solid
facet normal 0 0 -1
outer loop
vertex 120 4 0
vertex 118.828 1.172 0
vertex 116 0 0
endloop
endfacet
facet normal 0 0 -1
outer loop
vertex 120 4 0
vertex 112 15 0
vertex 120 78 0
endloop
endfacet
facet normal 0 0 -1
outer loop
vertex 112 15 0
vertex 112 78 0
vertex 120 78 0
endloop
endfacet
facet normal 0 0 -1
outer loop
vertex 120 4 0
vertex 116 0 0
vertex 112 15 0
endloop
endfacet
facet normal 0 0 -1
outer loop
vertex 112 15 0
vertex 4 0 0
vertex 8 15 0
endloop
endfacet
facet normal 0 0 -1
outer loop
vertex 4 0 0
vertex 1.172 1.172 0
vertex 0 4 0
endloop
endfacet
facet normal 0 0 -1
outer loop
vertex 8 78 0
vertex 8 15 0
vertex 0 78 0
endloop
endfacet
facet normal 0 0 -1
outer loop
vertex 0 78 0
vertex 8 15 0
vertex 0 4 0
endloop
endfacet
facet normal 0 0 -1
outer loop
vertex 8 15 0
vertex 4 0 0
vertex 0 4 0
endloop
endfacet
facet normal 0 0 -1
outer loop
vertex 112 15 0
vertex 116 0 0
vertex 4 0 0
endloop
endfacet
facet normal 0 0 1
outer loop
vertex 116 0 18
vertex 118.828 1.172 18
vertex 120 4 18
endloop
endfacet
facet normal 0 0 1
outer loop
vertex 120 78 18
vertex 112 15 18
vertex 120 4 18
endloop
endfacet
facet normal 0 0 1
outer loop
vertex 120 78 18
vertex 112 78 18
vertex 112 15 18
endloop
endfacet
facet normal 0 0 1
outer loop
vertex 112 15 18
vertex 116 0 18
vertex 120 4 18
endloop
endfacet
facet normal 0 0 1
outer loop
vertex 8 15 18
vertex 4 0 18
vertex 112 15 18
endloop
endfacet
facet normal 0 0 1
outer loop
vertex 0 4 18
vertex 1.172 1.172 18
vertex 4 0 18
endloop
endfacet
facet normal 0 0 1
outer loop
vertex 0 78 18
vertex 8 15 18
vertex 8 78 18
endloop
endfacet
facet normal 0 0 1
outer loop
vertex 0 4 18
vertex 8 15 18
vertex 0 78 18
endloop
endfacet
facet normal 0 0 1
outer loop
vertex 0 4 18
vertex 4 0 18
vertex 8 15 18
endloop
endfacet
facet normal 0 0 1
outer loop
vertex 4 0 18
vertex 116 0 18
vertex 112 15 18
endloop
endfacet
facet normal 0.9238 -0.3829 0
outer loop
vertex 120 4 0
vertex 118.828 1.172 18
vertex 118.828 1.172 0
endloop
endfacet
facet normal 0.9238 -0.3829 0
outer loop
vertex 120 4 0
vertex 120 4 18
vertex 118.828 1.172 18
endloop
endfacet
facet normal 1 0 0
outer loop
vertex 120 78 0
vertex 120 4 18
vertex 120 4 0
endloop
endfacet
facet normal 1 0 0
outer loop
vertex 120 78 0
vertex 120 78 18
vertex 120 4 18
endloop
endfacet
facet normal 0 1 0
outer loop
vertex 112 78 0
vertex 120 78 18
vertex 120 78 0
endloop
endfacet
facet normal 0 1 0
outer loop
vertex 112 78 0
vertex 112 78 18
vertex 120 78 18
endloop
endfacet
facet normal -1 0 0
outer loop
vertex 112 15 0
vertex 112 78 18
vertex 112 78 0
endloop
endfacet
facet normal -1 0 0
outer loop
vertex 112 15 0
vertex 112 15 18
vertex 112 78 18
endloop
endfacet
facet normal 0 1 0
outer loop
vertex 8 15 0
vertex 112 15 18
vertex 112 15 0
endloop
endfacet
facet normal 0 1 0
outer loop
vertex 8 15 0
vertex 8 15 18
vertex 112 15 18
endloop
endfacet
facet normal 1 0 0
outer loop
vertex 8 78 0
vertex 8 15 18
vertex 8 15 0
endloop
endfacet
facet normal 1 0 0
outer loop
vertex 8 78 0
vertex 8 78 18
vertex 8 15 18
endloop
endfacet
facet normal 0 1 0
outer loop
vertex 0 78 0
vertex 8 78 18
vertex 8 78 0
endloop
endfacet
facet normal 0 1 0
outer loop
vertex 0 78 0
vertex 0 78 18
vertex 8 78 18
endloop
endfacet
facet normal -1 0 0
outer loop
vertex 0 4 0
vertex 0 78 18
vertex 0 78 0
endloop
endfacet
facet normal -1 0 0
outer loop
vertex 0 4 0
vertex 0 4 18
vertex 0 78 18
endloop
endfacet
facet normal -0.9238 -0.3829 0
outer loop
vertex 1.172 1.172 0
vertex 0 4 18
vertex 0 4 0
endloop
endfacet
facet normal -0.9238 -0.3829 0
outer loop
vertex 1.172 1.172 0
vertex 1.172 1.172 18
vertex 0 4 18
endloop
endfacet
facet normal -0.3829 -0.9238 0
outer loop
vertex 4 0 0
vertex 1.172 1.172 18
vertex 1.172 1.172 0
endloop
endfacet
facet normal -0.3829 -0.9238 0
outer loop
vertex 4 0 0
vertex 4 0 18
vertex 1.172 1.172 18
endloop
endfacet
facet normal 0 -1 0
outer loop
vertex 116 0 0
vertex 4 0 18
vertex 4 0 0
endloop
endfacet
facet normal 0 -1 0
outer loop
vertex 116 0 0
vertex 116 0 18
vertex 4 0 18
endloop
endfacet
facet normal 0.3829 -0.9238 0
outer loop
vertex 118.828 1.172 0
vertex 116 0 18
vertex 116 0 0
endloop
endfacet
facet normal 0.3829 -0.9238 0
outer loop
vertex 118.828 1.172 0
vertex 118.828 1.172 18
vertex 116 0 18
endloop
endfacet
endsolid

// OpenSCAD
$fn = 32;

// ----------------------------------------------------------------------
// Heat sink frame: 120 x 78 mm frame, 8 mm walls
// ----------------------------------------------------------------------

// --- parameters (mm) ---
profile_height = 18;      // extrusion height
profile_points = 12;      // points of the closed outline

profile = [[0, 4], [1.172, 1.172], [4, 0], [116, 0], [118.828, 1.172], [120, 4], [120, 78], [112, 78], [112, 15], [8, 15], [8, 78], [0, 78]];  // single closed polygon, 12 points, counter clockwise

// --- the one profile operation ---
linear_extrude(height = profile_height) polygon(points = profile);
